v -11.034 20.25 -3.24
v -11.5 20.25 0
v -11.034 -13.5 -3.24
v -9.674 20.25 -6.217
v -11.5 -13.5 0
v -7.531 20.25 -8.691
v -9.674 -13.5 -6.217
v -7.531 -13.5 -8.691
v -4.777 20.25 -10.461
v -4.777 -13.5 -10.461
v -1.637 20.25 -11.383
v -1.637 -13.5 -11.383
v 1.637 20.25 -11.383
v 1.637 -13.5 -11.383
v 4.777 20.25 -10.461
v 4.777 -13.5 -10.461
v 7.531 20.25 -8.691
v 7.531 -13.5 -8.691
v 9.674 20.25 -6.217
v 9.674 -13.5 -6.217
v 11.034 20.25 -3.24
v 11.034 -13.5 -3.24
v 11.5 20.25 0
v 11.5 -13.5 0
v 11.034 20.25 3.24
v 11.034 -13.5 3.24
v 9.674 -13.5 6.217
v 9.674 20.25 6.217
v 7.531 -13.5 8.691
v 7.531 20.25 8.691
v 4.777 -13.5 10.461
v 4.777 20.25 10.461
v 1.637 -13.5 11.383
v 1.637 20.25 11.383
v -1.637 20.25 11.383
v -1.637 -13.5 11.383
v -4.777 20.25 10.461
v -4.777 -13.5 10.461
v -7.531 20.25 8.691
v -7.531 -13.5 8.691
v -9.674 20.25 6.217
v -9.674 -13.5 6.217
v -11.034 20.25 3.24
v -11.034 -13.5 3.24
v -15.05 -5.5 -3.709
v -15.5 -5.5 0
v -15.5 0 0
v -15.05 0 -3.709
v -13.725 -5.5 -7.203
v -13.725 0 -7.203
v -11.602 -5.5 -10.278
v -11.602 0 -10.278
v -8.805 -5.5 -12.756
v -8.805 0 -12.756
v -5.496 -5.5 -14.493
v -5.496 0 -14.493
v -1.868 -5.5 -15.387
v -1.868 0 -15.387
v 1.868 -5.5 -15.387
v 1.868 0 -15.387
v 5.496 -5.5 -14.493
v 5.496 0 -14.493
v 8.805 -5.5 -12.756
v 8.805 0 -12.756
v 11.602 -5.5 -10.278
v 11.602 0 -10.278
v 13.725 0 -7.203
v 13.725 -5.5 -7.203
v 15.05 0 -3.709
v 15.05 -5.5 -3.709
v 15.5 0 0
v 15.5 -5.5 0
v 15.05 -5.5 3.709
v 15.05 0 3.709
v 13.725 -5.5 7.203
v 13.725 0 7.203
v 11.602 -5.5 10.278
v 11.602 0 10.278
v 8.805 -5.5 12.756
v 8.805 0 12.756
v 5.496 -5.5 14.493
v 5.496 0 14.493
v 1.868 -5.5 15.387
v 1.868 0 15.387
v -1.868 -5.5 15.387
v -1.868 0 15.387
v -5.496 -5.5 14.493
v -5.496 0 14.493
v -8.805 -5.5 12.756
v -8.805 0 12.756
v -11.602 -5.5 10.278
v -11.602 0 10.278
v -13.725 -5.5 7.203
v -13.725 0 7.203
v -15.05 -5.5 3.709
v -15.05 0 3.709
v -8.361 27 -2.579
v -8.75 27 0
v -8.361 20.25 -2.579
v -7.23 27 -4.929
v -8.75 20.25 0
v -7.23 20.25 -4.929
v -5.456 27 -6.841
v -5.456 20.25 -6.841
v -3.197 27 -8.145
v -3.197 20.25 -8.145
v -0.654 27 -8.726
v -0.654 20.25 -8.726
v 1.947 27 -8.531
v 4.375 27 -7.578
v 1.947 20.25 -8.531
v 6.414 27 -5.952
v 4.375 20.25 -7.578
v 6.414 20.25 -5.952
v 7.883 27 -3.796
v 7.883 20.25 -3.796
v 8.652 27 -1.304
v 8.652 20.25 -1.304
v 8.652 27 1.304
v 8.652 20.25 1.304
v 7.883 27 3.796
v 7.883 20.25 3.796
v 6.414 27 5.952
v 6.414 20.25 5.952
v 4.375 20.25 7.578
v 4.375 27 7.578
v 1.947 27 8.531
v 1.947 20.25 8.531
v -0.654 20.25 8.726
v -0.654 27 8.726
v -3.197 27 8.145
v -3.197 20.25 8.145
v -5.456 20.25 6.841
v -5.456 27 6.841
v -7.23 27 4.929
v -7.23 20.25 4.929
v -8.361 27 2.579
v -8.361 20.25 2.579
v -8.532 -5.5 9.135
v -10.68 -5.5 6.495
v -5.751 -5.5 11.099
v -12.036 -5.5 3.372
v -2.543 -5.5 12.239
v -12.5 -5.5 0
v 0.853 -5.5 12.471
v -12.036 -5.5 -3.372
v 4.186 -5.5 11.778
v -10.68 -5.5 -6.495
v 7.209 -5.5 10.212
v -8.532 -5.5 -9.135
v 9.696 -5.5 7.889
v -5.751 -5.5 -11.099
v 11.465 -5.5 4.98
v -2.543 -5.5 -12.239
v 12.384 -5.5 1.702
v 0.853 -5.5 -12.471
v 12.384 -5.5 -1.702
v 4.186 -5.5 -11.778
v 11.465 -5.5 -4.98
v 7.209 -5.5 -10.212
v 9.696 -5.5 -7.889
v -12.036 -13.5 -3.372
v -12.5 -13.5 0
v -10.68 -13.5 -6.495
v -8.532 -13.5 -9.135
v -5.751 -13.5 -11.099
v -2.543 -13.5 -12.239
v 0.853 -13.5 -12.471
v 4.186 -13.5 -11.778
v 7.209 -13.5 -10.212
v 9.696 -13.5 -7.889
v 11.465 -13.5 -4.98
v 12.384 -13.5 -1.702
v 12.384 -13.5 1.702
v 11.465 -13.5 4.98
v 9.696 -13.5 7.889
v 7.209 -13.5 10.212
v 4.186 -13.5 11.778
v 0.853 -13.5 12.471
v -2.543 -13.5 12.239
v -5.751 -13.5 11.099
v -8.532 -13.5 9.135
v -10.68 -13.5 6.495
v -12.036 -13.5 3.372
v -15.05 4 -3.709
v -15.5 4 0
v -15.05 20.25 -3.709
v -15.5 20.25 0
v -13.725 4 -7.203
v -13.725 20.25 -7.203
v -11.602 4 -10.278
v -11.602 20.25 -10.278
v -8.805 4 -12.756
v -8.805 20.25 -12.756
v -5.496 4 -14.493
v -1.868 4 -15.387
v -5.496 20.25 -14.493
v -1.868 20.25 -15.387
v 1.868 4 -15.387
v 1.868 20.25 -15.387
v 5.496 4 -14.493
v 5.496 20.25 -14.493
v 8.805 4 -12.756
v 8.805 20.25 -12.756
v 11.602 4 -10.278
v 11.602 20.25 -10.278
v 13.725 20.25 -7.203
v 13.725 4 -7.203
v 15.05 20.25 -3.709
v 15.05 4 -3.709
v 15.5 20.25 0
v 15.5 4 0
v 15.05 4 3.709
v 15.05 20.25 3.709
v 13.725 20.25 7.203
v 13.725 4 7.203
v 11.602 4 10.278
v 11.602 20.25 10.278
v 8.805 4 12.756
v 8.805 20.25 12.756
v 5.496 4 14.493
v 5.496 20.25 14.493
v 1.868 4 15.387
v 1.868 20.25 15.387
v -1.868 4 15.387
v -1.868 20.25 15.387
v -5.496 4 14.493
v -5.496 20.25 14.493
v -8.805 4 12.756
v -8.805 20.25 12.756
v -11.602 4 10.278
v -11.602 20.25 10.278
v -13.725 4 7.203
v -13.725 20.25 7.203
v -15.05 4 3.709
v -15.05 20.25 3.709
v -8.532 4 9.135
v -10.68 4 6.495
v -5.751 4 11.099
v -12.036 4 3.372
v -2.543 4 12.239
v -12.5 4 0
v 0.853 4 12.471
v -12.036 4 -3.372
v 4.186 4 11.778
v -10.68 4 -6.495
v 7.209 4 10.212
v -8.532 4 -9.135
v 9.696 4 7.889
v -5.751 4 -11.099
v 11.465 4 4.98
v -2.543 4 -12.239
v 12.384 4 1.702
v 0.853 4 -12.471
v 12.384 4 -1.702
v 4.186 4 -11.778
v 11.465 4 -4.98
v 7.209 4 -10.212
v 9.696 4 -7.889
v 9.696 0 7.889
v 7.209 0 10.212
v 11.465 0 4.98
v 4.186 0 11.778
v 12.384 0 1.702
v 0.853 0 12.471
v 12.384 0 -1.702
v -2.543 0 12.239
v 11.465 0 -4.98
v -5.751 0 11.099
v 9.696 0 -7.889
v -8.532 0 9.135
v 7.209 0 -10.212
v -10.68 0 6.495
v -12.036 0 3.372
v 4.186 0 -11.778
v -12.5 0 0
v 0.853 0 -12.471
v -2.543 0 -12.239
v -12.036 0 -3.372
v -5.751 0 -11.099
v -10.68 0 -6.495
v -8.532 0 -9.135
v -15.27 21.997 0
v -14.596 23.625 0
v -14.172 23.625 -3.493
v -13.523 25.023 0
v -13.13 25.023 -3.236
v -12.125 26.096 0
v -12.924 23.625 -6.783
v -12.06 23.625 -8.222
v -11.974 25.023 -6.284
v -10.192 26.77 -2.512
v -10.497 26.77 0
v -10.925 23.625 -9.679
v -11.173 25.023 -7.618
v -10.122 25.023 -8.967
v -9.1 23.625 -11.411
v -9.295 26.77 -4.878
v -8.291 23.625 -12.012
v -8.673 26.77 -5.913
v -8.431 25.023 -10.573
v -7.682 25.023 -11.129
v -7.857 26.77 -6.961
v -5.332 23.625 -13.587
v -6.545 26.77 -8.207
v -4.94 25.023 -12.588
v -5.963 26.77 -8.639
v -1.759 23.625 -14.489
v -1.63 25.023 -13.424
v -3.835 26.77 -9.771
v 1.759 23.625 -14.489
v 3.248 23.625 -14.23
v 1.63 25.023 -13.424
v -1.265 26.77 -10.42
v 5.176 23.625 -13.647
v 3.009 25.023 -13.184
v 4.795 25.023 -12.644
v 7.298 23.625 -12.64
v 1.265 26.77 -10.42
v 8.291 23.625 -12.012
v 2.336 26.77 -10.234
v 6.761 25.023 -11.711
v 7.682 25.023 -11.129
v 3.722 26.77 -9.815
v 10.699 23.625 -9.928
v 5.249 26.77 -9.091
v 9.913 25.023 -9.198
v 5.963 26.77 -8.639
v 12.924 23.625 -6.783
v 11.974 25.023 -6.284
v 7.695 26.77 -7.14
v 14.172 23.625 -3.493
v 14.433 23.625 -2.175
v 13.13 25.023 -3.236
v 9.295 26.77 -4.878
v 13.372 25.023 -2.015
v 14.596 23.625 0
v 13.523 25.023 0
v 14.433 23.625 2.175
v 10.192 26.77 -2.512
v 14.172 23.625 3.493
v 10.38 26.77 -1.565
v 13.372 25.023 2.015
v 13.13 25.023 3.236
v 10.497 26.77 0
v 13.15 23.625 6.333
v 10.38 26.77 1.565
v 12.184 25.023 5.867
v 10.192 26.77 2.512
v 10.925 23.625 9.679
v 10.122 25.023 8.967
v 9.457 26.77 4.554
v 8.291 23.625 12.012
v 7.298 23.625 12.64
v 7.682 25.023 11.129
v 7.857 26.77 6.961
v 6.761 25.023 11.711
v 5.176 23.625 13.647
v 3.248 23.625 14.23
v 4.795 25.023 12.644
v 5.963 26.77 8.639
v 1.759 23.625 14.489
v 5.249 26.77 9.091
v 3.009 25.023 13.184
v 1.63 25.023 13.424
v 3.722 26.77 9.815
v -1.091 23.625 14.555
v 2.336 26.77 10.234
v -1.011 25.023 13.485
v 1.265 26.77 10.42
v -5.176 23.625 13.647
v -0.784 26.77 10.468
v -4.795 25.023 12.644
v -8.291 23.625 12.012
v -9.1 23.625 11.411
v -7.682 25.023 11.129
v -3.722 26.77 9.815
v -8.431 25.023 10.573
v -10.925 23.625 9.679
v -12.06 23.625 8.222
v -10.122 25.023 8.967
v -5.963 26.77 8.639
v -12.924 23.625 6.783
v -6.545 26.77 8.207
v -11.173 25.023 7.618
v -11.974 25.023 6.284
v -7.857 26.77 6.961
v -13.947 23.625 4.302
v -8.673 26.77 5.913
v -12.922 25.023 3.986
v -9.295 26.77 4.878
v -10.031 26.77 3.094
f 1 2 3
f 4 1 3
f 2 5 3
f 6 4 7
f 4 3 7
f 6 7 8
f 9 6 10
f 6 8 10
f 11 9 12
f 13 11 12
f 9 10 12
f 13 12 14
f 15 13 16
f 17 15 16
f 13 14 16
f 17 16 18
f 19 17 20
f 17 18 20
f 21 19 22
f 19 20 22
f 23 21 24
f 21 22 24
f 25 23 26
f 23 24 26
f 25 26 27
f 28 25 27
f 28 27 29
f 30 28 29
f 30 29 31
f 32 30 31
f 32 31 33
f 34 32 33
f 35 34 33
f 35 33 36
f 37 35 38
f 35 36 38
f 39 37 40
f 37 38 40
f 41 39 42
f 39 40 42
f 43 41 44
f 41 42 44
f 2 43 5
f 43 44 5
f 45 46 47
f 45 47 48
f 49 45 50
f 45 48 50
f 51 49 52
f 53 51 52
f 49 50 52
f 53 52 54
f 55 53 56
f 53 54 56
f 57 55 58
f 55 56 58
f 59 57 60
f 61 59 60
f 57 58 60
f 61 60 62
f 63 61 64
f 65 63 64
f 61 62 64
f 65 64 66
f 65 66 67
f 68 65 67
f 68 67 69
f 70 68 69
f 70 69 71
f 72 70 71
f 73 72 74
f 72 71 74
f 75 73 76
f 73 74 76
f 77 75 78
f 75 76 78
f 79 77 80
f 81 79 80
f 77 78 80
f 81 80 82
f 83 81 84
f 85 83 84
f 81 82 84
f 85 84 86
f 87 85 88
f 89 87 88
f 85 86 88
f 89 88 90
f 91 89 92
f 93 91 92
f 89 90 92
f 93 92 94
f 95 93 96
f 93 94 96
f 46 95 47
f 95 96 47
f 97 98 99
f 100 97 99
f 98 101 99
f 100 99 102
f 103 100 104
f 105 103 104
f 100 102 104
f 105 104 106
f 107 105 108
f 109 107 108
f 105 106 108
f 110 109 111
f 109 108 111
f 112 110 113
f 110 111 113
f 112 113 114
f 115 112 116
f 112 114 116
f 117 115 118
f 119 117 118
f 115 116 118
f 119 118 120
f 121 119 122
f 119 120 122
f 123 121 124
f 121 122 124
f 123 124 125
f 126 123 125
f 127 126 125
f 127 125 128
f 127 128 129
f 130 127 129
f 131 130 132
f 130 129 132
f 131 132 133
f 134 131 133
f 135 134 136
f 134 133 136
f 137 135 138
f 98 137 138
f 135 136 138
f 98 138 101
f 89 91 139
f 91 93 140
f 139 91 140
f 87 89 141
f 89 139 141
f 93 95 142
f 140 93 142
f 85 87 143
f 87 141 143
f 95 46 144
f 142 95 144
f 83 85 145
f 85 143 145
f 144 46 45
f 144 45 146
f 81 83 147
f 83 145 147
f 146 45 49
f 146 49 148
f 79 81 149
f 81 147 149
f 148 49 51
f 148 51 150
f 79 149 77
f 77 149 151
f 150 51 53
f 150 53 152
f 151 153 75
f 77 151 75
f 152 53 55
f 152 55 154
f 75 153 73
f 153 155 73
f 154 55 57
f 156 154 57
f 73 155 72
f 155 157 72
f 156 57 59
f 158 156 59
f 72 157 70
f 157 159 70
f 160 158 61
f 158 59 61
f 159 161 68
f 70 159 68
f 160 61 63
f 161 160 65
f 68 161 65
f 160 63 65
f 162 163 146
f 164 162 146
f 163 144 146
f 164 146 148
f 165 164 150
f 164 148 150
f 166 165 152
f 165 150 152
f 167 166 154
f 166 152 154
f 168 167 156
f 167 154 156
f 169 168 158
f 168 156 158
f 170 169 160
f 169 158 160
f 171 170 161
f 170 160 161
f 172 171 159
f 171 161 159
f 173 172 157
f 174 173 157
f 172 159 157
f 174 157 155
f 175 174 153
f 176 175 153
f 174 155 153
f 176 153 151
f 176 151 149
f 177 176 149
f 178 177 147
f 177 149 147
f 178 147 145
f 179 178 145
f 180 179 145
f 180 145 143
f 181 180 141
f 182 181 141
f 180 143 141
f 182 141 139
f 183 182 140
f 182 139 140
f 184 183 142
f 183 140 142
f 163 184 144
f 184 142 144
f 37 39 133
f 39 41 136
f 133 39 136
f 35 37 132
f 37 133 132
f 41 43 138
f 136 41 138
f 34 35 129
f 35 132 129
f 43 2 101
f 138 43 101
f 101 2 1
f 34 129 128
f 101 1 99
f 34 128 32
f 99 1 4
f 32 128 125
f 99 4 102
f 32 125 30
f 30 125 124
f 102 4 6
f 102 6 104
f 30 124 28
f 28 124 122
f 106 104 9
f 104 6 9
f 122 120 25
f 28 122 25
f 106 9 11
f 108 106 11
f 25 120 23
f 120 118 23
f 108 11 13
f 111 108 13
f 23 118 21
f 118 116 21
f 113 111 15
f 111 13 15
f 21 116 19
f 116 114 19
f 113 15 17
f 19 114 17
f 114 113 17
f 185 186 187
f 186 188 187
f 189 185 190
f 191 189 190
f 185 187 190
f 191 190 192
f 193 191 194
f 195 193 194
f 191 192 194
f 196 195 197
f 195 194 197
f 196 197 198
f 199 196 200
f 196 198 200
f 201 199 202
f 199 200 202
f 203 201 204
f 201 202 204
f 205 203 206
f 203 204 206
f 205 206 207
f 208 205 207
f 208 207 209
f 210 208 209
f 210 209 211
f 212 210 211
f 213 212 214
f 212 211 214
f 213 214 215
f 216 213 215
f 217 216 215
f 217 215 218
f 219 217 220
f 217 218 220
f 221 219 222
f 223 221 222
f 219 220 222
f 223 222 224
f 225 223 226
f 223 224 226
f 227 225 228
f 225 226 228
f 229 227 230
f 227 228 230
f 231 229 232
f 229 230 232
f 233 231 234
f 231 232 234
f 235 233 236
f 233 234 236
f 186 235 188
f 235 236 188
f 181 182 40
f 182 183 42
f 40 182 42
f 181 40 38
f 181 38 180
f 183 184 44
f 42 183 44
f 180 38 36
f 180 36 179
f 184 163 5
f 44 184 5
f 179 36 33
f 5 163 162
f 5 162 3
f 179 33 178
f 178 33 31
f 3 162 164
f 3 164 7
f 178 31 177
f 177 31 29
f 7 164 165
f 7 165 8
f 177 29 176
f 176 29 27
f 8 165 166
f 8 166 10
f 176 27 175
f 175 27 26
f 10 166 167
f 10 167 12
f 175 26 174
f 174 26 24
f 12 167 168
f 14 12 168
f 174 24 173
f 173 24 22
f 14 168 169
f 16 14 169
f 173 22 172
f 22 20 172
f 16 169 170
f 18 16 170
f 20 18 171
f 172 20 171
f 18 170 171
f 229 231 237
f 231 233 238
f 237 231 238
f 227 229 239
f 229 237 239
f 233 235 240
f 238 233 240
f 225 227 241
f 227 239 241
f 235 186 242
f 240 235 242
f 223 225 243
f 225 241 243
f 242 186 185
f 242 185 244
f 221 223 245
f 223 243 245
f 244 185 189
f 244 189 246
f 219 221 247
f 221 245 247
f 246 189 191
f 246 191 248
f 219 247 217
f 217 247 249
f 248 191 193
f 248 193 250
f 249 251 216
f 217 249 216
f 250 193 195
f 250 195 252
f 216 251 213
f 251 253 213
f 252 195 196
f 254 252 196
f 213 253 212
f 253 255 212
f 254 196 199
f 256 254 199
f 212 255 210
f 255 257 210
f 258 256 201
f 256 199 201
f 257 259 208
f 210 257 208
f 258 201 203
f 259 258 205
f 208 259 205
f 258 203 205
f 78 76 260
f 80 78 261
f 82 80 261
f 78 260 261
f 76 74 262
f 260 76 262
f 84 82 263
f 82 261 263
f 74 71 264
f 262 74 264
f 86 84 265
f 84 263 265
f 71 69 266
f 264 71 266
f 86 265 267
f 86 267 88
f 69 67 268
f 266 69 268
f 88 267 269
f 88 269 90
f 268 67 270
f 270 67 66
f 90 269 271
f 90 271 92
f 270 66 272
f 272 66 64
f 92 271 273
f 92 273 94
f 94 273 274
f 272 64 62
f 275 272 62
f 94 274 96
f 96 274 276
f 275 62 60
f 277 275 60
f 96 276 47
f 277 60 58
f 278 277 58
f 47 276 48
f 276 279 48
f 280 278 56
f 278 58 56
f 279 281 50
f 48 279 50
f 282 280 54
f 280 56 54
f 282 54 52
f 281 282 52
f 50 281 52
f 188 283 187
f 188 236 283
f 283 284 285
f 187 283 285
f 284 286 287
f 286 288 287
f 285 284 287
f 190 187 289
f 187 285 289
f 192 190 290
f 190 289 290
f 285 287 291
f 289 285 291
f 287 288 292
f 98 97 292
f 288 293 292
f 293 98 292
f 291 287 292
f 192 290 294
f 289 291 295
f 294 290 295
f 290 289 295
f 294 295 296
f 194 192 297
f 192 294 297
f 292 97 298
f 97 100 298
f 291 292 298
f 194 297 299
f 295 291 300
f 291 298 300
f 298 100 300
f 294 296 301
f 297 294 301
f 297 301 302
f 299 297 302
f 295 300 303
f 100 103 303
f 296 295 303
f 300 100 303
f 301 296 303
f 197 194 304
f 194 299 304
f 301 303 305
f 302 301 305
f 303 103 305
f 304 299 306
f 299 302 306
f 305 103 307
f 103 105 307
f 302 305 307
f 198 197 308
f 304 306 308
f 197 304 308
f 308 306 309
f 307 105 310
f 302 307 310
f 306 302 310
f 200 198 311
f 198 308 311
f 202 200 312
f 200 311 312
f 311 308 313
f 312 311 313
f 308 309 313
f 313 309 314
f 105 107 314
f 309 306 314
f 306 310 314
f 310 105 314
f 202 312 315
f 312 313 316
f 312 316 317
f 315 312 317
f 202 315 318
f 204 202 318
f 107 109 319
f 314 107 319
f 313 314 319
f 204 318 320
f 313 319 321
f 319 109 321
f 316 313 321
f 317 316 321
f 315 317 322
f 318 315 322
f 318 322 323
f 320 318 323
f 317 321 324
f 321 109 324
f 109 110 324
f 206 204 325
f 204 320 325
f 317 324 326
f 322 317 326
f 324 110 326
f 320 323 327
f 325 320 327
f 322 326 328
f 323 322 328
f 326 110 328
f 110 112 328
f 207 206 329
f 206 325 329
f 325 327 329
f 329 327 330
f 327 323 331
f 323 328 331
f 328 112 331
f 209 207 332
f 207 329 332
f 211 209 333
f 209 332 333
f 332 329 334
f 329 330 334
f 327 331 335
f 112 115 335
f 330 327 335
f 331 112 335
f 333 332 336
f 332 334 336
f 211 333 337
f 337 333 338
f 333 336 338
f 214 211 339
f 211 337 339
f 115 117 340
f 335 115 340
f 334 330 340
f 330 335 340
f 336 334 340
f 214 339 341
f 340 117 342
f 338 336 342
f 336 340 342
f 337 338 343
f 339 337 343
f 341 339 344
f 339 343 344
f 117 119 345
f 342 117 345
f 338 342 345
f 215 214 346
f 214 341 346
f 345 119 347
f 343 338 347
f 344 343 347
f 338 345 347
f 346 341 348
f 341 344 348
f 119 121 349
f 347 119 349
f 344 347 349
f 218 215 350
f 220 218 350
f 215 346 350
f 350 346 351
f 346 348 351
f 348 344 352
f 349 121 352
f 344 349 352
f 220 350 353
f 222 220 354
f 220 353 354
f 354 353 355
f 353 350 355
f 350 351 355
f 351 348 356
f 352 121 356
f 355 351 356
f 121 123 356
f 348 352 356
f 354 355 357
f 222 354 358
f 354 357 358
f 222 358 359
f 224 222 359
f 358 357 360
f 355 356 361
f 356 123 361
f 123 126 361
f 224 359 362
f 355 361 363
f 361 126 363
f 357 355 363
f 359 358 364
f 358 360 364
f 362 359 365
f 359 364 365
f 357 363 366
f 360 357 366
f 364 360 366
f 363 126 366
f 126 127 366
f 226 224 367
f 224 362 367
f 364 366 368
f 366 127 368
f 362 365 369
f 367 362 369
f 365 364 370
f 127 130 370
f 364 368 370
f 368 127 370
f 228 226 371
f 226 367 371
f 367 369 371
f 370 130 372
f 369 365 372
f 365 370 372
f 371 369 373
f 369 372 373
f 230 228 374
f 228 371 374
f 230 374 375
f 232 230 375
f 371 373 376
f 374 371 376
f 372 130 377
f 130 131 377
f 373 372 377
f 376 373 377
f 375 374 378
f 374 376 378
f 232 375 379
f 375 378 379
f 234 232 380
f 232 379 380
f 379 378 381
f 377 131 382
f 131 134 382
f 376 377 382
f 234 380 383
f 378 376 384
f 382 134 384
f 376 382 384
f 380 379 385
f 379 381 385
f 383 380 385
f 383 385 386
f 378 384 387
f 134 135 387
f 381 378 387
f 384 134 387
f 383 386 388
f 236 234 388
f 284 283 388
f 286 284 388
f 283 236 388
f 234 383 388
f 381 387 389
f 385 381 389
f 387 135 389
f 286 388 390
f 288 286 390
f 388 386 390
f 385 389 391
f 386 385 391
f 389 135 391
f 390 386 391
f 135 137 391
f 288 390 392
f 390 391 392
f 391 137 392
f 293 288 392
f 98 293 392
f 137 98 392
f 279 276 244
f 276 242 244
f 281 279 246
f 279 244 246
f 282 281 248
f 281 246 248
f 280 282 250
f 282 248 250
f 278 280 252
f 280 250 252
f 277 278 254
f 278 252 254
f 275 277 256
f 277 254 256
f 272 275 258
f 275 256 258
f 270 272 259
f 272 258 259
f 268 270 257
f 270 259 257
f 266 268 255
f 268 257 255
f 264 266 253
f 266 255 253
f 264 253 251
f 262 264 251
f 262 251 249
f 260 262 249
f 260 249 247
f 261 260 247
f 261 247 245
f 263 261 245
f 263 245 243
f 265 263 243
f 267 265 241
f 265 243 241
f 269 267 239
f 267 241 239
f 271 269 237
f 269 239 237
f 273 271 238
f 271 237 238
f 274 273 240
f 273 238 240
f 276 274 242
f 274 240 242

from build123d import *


with BuildPart() as part:
    # Skizze2 → Rotation1 (revolve)
    with BuildSketch(Plane.XY):
        with BuildLine():
            Line((8.75, 20.25), (11.5, 20.25))
            Line((11.5, 20.25), (11.5, -13.5))
            Line((11.5, -13.5), (12.5, -13.5))
            Line((12.5, -13.5), (12.5, -5.5))
            Line((12.5, -5.5), (15.5, -5.5))
            Line((15.5, -5.5), (15.5, 0))
            Line((15.5, 0), (12.5, 0))
            Line((12.5, 0), (12.5, 4))
            Line((12.5, 4), (15.5, 4))
            Line((15.5, 4), (15.5, 20.25))
            ThreePointArc((15.5, 20.25), (13.522970773, 25.022970773), (8.75, 27))
            Line((8.75, 27), (8.75, 20.25))
        make_face()
    revolve(axis=Axis((0, 275.175103998, 0), (0, -1, 0)))


solid = part.part
